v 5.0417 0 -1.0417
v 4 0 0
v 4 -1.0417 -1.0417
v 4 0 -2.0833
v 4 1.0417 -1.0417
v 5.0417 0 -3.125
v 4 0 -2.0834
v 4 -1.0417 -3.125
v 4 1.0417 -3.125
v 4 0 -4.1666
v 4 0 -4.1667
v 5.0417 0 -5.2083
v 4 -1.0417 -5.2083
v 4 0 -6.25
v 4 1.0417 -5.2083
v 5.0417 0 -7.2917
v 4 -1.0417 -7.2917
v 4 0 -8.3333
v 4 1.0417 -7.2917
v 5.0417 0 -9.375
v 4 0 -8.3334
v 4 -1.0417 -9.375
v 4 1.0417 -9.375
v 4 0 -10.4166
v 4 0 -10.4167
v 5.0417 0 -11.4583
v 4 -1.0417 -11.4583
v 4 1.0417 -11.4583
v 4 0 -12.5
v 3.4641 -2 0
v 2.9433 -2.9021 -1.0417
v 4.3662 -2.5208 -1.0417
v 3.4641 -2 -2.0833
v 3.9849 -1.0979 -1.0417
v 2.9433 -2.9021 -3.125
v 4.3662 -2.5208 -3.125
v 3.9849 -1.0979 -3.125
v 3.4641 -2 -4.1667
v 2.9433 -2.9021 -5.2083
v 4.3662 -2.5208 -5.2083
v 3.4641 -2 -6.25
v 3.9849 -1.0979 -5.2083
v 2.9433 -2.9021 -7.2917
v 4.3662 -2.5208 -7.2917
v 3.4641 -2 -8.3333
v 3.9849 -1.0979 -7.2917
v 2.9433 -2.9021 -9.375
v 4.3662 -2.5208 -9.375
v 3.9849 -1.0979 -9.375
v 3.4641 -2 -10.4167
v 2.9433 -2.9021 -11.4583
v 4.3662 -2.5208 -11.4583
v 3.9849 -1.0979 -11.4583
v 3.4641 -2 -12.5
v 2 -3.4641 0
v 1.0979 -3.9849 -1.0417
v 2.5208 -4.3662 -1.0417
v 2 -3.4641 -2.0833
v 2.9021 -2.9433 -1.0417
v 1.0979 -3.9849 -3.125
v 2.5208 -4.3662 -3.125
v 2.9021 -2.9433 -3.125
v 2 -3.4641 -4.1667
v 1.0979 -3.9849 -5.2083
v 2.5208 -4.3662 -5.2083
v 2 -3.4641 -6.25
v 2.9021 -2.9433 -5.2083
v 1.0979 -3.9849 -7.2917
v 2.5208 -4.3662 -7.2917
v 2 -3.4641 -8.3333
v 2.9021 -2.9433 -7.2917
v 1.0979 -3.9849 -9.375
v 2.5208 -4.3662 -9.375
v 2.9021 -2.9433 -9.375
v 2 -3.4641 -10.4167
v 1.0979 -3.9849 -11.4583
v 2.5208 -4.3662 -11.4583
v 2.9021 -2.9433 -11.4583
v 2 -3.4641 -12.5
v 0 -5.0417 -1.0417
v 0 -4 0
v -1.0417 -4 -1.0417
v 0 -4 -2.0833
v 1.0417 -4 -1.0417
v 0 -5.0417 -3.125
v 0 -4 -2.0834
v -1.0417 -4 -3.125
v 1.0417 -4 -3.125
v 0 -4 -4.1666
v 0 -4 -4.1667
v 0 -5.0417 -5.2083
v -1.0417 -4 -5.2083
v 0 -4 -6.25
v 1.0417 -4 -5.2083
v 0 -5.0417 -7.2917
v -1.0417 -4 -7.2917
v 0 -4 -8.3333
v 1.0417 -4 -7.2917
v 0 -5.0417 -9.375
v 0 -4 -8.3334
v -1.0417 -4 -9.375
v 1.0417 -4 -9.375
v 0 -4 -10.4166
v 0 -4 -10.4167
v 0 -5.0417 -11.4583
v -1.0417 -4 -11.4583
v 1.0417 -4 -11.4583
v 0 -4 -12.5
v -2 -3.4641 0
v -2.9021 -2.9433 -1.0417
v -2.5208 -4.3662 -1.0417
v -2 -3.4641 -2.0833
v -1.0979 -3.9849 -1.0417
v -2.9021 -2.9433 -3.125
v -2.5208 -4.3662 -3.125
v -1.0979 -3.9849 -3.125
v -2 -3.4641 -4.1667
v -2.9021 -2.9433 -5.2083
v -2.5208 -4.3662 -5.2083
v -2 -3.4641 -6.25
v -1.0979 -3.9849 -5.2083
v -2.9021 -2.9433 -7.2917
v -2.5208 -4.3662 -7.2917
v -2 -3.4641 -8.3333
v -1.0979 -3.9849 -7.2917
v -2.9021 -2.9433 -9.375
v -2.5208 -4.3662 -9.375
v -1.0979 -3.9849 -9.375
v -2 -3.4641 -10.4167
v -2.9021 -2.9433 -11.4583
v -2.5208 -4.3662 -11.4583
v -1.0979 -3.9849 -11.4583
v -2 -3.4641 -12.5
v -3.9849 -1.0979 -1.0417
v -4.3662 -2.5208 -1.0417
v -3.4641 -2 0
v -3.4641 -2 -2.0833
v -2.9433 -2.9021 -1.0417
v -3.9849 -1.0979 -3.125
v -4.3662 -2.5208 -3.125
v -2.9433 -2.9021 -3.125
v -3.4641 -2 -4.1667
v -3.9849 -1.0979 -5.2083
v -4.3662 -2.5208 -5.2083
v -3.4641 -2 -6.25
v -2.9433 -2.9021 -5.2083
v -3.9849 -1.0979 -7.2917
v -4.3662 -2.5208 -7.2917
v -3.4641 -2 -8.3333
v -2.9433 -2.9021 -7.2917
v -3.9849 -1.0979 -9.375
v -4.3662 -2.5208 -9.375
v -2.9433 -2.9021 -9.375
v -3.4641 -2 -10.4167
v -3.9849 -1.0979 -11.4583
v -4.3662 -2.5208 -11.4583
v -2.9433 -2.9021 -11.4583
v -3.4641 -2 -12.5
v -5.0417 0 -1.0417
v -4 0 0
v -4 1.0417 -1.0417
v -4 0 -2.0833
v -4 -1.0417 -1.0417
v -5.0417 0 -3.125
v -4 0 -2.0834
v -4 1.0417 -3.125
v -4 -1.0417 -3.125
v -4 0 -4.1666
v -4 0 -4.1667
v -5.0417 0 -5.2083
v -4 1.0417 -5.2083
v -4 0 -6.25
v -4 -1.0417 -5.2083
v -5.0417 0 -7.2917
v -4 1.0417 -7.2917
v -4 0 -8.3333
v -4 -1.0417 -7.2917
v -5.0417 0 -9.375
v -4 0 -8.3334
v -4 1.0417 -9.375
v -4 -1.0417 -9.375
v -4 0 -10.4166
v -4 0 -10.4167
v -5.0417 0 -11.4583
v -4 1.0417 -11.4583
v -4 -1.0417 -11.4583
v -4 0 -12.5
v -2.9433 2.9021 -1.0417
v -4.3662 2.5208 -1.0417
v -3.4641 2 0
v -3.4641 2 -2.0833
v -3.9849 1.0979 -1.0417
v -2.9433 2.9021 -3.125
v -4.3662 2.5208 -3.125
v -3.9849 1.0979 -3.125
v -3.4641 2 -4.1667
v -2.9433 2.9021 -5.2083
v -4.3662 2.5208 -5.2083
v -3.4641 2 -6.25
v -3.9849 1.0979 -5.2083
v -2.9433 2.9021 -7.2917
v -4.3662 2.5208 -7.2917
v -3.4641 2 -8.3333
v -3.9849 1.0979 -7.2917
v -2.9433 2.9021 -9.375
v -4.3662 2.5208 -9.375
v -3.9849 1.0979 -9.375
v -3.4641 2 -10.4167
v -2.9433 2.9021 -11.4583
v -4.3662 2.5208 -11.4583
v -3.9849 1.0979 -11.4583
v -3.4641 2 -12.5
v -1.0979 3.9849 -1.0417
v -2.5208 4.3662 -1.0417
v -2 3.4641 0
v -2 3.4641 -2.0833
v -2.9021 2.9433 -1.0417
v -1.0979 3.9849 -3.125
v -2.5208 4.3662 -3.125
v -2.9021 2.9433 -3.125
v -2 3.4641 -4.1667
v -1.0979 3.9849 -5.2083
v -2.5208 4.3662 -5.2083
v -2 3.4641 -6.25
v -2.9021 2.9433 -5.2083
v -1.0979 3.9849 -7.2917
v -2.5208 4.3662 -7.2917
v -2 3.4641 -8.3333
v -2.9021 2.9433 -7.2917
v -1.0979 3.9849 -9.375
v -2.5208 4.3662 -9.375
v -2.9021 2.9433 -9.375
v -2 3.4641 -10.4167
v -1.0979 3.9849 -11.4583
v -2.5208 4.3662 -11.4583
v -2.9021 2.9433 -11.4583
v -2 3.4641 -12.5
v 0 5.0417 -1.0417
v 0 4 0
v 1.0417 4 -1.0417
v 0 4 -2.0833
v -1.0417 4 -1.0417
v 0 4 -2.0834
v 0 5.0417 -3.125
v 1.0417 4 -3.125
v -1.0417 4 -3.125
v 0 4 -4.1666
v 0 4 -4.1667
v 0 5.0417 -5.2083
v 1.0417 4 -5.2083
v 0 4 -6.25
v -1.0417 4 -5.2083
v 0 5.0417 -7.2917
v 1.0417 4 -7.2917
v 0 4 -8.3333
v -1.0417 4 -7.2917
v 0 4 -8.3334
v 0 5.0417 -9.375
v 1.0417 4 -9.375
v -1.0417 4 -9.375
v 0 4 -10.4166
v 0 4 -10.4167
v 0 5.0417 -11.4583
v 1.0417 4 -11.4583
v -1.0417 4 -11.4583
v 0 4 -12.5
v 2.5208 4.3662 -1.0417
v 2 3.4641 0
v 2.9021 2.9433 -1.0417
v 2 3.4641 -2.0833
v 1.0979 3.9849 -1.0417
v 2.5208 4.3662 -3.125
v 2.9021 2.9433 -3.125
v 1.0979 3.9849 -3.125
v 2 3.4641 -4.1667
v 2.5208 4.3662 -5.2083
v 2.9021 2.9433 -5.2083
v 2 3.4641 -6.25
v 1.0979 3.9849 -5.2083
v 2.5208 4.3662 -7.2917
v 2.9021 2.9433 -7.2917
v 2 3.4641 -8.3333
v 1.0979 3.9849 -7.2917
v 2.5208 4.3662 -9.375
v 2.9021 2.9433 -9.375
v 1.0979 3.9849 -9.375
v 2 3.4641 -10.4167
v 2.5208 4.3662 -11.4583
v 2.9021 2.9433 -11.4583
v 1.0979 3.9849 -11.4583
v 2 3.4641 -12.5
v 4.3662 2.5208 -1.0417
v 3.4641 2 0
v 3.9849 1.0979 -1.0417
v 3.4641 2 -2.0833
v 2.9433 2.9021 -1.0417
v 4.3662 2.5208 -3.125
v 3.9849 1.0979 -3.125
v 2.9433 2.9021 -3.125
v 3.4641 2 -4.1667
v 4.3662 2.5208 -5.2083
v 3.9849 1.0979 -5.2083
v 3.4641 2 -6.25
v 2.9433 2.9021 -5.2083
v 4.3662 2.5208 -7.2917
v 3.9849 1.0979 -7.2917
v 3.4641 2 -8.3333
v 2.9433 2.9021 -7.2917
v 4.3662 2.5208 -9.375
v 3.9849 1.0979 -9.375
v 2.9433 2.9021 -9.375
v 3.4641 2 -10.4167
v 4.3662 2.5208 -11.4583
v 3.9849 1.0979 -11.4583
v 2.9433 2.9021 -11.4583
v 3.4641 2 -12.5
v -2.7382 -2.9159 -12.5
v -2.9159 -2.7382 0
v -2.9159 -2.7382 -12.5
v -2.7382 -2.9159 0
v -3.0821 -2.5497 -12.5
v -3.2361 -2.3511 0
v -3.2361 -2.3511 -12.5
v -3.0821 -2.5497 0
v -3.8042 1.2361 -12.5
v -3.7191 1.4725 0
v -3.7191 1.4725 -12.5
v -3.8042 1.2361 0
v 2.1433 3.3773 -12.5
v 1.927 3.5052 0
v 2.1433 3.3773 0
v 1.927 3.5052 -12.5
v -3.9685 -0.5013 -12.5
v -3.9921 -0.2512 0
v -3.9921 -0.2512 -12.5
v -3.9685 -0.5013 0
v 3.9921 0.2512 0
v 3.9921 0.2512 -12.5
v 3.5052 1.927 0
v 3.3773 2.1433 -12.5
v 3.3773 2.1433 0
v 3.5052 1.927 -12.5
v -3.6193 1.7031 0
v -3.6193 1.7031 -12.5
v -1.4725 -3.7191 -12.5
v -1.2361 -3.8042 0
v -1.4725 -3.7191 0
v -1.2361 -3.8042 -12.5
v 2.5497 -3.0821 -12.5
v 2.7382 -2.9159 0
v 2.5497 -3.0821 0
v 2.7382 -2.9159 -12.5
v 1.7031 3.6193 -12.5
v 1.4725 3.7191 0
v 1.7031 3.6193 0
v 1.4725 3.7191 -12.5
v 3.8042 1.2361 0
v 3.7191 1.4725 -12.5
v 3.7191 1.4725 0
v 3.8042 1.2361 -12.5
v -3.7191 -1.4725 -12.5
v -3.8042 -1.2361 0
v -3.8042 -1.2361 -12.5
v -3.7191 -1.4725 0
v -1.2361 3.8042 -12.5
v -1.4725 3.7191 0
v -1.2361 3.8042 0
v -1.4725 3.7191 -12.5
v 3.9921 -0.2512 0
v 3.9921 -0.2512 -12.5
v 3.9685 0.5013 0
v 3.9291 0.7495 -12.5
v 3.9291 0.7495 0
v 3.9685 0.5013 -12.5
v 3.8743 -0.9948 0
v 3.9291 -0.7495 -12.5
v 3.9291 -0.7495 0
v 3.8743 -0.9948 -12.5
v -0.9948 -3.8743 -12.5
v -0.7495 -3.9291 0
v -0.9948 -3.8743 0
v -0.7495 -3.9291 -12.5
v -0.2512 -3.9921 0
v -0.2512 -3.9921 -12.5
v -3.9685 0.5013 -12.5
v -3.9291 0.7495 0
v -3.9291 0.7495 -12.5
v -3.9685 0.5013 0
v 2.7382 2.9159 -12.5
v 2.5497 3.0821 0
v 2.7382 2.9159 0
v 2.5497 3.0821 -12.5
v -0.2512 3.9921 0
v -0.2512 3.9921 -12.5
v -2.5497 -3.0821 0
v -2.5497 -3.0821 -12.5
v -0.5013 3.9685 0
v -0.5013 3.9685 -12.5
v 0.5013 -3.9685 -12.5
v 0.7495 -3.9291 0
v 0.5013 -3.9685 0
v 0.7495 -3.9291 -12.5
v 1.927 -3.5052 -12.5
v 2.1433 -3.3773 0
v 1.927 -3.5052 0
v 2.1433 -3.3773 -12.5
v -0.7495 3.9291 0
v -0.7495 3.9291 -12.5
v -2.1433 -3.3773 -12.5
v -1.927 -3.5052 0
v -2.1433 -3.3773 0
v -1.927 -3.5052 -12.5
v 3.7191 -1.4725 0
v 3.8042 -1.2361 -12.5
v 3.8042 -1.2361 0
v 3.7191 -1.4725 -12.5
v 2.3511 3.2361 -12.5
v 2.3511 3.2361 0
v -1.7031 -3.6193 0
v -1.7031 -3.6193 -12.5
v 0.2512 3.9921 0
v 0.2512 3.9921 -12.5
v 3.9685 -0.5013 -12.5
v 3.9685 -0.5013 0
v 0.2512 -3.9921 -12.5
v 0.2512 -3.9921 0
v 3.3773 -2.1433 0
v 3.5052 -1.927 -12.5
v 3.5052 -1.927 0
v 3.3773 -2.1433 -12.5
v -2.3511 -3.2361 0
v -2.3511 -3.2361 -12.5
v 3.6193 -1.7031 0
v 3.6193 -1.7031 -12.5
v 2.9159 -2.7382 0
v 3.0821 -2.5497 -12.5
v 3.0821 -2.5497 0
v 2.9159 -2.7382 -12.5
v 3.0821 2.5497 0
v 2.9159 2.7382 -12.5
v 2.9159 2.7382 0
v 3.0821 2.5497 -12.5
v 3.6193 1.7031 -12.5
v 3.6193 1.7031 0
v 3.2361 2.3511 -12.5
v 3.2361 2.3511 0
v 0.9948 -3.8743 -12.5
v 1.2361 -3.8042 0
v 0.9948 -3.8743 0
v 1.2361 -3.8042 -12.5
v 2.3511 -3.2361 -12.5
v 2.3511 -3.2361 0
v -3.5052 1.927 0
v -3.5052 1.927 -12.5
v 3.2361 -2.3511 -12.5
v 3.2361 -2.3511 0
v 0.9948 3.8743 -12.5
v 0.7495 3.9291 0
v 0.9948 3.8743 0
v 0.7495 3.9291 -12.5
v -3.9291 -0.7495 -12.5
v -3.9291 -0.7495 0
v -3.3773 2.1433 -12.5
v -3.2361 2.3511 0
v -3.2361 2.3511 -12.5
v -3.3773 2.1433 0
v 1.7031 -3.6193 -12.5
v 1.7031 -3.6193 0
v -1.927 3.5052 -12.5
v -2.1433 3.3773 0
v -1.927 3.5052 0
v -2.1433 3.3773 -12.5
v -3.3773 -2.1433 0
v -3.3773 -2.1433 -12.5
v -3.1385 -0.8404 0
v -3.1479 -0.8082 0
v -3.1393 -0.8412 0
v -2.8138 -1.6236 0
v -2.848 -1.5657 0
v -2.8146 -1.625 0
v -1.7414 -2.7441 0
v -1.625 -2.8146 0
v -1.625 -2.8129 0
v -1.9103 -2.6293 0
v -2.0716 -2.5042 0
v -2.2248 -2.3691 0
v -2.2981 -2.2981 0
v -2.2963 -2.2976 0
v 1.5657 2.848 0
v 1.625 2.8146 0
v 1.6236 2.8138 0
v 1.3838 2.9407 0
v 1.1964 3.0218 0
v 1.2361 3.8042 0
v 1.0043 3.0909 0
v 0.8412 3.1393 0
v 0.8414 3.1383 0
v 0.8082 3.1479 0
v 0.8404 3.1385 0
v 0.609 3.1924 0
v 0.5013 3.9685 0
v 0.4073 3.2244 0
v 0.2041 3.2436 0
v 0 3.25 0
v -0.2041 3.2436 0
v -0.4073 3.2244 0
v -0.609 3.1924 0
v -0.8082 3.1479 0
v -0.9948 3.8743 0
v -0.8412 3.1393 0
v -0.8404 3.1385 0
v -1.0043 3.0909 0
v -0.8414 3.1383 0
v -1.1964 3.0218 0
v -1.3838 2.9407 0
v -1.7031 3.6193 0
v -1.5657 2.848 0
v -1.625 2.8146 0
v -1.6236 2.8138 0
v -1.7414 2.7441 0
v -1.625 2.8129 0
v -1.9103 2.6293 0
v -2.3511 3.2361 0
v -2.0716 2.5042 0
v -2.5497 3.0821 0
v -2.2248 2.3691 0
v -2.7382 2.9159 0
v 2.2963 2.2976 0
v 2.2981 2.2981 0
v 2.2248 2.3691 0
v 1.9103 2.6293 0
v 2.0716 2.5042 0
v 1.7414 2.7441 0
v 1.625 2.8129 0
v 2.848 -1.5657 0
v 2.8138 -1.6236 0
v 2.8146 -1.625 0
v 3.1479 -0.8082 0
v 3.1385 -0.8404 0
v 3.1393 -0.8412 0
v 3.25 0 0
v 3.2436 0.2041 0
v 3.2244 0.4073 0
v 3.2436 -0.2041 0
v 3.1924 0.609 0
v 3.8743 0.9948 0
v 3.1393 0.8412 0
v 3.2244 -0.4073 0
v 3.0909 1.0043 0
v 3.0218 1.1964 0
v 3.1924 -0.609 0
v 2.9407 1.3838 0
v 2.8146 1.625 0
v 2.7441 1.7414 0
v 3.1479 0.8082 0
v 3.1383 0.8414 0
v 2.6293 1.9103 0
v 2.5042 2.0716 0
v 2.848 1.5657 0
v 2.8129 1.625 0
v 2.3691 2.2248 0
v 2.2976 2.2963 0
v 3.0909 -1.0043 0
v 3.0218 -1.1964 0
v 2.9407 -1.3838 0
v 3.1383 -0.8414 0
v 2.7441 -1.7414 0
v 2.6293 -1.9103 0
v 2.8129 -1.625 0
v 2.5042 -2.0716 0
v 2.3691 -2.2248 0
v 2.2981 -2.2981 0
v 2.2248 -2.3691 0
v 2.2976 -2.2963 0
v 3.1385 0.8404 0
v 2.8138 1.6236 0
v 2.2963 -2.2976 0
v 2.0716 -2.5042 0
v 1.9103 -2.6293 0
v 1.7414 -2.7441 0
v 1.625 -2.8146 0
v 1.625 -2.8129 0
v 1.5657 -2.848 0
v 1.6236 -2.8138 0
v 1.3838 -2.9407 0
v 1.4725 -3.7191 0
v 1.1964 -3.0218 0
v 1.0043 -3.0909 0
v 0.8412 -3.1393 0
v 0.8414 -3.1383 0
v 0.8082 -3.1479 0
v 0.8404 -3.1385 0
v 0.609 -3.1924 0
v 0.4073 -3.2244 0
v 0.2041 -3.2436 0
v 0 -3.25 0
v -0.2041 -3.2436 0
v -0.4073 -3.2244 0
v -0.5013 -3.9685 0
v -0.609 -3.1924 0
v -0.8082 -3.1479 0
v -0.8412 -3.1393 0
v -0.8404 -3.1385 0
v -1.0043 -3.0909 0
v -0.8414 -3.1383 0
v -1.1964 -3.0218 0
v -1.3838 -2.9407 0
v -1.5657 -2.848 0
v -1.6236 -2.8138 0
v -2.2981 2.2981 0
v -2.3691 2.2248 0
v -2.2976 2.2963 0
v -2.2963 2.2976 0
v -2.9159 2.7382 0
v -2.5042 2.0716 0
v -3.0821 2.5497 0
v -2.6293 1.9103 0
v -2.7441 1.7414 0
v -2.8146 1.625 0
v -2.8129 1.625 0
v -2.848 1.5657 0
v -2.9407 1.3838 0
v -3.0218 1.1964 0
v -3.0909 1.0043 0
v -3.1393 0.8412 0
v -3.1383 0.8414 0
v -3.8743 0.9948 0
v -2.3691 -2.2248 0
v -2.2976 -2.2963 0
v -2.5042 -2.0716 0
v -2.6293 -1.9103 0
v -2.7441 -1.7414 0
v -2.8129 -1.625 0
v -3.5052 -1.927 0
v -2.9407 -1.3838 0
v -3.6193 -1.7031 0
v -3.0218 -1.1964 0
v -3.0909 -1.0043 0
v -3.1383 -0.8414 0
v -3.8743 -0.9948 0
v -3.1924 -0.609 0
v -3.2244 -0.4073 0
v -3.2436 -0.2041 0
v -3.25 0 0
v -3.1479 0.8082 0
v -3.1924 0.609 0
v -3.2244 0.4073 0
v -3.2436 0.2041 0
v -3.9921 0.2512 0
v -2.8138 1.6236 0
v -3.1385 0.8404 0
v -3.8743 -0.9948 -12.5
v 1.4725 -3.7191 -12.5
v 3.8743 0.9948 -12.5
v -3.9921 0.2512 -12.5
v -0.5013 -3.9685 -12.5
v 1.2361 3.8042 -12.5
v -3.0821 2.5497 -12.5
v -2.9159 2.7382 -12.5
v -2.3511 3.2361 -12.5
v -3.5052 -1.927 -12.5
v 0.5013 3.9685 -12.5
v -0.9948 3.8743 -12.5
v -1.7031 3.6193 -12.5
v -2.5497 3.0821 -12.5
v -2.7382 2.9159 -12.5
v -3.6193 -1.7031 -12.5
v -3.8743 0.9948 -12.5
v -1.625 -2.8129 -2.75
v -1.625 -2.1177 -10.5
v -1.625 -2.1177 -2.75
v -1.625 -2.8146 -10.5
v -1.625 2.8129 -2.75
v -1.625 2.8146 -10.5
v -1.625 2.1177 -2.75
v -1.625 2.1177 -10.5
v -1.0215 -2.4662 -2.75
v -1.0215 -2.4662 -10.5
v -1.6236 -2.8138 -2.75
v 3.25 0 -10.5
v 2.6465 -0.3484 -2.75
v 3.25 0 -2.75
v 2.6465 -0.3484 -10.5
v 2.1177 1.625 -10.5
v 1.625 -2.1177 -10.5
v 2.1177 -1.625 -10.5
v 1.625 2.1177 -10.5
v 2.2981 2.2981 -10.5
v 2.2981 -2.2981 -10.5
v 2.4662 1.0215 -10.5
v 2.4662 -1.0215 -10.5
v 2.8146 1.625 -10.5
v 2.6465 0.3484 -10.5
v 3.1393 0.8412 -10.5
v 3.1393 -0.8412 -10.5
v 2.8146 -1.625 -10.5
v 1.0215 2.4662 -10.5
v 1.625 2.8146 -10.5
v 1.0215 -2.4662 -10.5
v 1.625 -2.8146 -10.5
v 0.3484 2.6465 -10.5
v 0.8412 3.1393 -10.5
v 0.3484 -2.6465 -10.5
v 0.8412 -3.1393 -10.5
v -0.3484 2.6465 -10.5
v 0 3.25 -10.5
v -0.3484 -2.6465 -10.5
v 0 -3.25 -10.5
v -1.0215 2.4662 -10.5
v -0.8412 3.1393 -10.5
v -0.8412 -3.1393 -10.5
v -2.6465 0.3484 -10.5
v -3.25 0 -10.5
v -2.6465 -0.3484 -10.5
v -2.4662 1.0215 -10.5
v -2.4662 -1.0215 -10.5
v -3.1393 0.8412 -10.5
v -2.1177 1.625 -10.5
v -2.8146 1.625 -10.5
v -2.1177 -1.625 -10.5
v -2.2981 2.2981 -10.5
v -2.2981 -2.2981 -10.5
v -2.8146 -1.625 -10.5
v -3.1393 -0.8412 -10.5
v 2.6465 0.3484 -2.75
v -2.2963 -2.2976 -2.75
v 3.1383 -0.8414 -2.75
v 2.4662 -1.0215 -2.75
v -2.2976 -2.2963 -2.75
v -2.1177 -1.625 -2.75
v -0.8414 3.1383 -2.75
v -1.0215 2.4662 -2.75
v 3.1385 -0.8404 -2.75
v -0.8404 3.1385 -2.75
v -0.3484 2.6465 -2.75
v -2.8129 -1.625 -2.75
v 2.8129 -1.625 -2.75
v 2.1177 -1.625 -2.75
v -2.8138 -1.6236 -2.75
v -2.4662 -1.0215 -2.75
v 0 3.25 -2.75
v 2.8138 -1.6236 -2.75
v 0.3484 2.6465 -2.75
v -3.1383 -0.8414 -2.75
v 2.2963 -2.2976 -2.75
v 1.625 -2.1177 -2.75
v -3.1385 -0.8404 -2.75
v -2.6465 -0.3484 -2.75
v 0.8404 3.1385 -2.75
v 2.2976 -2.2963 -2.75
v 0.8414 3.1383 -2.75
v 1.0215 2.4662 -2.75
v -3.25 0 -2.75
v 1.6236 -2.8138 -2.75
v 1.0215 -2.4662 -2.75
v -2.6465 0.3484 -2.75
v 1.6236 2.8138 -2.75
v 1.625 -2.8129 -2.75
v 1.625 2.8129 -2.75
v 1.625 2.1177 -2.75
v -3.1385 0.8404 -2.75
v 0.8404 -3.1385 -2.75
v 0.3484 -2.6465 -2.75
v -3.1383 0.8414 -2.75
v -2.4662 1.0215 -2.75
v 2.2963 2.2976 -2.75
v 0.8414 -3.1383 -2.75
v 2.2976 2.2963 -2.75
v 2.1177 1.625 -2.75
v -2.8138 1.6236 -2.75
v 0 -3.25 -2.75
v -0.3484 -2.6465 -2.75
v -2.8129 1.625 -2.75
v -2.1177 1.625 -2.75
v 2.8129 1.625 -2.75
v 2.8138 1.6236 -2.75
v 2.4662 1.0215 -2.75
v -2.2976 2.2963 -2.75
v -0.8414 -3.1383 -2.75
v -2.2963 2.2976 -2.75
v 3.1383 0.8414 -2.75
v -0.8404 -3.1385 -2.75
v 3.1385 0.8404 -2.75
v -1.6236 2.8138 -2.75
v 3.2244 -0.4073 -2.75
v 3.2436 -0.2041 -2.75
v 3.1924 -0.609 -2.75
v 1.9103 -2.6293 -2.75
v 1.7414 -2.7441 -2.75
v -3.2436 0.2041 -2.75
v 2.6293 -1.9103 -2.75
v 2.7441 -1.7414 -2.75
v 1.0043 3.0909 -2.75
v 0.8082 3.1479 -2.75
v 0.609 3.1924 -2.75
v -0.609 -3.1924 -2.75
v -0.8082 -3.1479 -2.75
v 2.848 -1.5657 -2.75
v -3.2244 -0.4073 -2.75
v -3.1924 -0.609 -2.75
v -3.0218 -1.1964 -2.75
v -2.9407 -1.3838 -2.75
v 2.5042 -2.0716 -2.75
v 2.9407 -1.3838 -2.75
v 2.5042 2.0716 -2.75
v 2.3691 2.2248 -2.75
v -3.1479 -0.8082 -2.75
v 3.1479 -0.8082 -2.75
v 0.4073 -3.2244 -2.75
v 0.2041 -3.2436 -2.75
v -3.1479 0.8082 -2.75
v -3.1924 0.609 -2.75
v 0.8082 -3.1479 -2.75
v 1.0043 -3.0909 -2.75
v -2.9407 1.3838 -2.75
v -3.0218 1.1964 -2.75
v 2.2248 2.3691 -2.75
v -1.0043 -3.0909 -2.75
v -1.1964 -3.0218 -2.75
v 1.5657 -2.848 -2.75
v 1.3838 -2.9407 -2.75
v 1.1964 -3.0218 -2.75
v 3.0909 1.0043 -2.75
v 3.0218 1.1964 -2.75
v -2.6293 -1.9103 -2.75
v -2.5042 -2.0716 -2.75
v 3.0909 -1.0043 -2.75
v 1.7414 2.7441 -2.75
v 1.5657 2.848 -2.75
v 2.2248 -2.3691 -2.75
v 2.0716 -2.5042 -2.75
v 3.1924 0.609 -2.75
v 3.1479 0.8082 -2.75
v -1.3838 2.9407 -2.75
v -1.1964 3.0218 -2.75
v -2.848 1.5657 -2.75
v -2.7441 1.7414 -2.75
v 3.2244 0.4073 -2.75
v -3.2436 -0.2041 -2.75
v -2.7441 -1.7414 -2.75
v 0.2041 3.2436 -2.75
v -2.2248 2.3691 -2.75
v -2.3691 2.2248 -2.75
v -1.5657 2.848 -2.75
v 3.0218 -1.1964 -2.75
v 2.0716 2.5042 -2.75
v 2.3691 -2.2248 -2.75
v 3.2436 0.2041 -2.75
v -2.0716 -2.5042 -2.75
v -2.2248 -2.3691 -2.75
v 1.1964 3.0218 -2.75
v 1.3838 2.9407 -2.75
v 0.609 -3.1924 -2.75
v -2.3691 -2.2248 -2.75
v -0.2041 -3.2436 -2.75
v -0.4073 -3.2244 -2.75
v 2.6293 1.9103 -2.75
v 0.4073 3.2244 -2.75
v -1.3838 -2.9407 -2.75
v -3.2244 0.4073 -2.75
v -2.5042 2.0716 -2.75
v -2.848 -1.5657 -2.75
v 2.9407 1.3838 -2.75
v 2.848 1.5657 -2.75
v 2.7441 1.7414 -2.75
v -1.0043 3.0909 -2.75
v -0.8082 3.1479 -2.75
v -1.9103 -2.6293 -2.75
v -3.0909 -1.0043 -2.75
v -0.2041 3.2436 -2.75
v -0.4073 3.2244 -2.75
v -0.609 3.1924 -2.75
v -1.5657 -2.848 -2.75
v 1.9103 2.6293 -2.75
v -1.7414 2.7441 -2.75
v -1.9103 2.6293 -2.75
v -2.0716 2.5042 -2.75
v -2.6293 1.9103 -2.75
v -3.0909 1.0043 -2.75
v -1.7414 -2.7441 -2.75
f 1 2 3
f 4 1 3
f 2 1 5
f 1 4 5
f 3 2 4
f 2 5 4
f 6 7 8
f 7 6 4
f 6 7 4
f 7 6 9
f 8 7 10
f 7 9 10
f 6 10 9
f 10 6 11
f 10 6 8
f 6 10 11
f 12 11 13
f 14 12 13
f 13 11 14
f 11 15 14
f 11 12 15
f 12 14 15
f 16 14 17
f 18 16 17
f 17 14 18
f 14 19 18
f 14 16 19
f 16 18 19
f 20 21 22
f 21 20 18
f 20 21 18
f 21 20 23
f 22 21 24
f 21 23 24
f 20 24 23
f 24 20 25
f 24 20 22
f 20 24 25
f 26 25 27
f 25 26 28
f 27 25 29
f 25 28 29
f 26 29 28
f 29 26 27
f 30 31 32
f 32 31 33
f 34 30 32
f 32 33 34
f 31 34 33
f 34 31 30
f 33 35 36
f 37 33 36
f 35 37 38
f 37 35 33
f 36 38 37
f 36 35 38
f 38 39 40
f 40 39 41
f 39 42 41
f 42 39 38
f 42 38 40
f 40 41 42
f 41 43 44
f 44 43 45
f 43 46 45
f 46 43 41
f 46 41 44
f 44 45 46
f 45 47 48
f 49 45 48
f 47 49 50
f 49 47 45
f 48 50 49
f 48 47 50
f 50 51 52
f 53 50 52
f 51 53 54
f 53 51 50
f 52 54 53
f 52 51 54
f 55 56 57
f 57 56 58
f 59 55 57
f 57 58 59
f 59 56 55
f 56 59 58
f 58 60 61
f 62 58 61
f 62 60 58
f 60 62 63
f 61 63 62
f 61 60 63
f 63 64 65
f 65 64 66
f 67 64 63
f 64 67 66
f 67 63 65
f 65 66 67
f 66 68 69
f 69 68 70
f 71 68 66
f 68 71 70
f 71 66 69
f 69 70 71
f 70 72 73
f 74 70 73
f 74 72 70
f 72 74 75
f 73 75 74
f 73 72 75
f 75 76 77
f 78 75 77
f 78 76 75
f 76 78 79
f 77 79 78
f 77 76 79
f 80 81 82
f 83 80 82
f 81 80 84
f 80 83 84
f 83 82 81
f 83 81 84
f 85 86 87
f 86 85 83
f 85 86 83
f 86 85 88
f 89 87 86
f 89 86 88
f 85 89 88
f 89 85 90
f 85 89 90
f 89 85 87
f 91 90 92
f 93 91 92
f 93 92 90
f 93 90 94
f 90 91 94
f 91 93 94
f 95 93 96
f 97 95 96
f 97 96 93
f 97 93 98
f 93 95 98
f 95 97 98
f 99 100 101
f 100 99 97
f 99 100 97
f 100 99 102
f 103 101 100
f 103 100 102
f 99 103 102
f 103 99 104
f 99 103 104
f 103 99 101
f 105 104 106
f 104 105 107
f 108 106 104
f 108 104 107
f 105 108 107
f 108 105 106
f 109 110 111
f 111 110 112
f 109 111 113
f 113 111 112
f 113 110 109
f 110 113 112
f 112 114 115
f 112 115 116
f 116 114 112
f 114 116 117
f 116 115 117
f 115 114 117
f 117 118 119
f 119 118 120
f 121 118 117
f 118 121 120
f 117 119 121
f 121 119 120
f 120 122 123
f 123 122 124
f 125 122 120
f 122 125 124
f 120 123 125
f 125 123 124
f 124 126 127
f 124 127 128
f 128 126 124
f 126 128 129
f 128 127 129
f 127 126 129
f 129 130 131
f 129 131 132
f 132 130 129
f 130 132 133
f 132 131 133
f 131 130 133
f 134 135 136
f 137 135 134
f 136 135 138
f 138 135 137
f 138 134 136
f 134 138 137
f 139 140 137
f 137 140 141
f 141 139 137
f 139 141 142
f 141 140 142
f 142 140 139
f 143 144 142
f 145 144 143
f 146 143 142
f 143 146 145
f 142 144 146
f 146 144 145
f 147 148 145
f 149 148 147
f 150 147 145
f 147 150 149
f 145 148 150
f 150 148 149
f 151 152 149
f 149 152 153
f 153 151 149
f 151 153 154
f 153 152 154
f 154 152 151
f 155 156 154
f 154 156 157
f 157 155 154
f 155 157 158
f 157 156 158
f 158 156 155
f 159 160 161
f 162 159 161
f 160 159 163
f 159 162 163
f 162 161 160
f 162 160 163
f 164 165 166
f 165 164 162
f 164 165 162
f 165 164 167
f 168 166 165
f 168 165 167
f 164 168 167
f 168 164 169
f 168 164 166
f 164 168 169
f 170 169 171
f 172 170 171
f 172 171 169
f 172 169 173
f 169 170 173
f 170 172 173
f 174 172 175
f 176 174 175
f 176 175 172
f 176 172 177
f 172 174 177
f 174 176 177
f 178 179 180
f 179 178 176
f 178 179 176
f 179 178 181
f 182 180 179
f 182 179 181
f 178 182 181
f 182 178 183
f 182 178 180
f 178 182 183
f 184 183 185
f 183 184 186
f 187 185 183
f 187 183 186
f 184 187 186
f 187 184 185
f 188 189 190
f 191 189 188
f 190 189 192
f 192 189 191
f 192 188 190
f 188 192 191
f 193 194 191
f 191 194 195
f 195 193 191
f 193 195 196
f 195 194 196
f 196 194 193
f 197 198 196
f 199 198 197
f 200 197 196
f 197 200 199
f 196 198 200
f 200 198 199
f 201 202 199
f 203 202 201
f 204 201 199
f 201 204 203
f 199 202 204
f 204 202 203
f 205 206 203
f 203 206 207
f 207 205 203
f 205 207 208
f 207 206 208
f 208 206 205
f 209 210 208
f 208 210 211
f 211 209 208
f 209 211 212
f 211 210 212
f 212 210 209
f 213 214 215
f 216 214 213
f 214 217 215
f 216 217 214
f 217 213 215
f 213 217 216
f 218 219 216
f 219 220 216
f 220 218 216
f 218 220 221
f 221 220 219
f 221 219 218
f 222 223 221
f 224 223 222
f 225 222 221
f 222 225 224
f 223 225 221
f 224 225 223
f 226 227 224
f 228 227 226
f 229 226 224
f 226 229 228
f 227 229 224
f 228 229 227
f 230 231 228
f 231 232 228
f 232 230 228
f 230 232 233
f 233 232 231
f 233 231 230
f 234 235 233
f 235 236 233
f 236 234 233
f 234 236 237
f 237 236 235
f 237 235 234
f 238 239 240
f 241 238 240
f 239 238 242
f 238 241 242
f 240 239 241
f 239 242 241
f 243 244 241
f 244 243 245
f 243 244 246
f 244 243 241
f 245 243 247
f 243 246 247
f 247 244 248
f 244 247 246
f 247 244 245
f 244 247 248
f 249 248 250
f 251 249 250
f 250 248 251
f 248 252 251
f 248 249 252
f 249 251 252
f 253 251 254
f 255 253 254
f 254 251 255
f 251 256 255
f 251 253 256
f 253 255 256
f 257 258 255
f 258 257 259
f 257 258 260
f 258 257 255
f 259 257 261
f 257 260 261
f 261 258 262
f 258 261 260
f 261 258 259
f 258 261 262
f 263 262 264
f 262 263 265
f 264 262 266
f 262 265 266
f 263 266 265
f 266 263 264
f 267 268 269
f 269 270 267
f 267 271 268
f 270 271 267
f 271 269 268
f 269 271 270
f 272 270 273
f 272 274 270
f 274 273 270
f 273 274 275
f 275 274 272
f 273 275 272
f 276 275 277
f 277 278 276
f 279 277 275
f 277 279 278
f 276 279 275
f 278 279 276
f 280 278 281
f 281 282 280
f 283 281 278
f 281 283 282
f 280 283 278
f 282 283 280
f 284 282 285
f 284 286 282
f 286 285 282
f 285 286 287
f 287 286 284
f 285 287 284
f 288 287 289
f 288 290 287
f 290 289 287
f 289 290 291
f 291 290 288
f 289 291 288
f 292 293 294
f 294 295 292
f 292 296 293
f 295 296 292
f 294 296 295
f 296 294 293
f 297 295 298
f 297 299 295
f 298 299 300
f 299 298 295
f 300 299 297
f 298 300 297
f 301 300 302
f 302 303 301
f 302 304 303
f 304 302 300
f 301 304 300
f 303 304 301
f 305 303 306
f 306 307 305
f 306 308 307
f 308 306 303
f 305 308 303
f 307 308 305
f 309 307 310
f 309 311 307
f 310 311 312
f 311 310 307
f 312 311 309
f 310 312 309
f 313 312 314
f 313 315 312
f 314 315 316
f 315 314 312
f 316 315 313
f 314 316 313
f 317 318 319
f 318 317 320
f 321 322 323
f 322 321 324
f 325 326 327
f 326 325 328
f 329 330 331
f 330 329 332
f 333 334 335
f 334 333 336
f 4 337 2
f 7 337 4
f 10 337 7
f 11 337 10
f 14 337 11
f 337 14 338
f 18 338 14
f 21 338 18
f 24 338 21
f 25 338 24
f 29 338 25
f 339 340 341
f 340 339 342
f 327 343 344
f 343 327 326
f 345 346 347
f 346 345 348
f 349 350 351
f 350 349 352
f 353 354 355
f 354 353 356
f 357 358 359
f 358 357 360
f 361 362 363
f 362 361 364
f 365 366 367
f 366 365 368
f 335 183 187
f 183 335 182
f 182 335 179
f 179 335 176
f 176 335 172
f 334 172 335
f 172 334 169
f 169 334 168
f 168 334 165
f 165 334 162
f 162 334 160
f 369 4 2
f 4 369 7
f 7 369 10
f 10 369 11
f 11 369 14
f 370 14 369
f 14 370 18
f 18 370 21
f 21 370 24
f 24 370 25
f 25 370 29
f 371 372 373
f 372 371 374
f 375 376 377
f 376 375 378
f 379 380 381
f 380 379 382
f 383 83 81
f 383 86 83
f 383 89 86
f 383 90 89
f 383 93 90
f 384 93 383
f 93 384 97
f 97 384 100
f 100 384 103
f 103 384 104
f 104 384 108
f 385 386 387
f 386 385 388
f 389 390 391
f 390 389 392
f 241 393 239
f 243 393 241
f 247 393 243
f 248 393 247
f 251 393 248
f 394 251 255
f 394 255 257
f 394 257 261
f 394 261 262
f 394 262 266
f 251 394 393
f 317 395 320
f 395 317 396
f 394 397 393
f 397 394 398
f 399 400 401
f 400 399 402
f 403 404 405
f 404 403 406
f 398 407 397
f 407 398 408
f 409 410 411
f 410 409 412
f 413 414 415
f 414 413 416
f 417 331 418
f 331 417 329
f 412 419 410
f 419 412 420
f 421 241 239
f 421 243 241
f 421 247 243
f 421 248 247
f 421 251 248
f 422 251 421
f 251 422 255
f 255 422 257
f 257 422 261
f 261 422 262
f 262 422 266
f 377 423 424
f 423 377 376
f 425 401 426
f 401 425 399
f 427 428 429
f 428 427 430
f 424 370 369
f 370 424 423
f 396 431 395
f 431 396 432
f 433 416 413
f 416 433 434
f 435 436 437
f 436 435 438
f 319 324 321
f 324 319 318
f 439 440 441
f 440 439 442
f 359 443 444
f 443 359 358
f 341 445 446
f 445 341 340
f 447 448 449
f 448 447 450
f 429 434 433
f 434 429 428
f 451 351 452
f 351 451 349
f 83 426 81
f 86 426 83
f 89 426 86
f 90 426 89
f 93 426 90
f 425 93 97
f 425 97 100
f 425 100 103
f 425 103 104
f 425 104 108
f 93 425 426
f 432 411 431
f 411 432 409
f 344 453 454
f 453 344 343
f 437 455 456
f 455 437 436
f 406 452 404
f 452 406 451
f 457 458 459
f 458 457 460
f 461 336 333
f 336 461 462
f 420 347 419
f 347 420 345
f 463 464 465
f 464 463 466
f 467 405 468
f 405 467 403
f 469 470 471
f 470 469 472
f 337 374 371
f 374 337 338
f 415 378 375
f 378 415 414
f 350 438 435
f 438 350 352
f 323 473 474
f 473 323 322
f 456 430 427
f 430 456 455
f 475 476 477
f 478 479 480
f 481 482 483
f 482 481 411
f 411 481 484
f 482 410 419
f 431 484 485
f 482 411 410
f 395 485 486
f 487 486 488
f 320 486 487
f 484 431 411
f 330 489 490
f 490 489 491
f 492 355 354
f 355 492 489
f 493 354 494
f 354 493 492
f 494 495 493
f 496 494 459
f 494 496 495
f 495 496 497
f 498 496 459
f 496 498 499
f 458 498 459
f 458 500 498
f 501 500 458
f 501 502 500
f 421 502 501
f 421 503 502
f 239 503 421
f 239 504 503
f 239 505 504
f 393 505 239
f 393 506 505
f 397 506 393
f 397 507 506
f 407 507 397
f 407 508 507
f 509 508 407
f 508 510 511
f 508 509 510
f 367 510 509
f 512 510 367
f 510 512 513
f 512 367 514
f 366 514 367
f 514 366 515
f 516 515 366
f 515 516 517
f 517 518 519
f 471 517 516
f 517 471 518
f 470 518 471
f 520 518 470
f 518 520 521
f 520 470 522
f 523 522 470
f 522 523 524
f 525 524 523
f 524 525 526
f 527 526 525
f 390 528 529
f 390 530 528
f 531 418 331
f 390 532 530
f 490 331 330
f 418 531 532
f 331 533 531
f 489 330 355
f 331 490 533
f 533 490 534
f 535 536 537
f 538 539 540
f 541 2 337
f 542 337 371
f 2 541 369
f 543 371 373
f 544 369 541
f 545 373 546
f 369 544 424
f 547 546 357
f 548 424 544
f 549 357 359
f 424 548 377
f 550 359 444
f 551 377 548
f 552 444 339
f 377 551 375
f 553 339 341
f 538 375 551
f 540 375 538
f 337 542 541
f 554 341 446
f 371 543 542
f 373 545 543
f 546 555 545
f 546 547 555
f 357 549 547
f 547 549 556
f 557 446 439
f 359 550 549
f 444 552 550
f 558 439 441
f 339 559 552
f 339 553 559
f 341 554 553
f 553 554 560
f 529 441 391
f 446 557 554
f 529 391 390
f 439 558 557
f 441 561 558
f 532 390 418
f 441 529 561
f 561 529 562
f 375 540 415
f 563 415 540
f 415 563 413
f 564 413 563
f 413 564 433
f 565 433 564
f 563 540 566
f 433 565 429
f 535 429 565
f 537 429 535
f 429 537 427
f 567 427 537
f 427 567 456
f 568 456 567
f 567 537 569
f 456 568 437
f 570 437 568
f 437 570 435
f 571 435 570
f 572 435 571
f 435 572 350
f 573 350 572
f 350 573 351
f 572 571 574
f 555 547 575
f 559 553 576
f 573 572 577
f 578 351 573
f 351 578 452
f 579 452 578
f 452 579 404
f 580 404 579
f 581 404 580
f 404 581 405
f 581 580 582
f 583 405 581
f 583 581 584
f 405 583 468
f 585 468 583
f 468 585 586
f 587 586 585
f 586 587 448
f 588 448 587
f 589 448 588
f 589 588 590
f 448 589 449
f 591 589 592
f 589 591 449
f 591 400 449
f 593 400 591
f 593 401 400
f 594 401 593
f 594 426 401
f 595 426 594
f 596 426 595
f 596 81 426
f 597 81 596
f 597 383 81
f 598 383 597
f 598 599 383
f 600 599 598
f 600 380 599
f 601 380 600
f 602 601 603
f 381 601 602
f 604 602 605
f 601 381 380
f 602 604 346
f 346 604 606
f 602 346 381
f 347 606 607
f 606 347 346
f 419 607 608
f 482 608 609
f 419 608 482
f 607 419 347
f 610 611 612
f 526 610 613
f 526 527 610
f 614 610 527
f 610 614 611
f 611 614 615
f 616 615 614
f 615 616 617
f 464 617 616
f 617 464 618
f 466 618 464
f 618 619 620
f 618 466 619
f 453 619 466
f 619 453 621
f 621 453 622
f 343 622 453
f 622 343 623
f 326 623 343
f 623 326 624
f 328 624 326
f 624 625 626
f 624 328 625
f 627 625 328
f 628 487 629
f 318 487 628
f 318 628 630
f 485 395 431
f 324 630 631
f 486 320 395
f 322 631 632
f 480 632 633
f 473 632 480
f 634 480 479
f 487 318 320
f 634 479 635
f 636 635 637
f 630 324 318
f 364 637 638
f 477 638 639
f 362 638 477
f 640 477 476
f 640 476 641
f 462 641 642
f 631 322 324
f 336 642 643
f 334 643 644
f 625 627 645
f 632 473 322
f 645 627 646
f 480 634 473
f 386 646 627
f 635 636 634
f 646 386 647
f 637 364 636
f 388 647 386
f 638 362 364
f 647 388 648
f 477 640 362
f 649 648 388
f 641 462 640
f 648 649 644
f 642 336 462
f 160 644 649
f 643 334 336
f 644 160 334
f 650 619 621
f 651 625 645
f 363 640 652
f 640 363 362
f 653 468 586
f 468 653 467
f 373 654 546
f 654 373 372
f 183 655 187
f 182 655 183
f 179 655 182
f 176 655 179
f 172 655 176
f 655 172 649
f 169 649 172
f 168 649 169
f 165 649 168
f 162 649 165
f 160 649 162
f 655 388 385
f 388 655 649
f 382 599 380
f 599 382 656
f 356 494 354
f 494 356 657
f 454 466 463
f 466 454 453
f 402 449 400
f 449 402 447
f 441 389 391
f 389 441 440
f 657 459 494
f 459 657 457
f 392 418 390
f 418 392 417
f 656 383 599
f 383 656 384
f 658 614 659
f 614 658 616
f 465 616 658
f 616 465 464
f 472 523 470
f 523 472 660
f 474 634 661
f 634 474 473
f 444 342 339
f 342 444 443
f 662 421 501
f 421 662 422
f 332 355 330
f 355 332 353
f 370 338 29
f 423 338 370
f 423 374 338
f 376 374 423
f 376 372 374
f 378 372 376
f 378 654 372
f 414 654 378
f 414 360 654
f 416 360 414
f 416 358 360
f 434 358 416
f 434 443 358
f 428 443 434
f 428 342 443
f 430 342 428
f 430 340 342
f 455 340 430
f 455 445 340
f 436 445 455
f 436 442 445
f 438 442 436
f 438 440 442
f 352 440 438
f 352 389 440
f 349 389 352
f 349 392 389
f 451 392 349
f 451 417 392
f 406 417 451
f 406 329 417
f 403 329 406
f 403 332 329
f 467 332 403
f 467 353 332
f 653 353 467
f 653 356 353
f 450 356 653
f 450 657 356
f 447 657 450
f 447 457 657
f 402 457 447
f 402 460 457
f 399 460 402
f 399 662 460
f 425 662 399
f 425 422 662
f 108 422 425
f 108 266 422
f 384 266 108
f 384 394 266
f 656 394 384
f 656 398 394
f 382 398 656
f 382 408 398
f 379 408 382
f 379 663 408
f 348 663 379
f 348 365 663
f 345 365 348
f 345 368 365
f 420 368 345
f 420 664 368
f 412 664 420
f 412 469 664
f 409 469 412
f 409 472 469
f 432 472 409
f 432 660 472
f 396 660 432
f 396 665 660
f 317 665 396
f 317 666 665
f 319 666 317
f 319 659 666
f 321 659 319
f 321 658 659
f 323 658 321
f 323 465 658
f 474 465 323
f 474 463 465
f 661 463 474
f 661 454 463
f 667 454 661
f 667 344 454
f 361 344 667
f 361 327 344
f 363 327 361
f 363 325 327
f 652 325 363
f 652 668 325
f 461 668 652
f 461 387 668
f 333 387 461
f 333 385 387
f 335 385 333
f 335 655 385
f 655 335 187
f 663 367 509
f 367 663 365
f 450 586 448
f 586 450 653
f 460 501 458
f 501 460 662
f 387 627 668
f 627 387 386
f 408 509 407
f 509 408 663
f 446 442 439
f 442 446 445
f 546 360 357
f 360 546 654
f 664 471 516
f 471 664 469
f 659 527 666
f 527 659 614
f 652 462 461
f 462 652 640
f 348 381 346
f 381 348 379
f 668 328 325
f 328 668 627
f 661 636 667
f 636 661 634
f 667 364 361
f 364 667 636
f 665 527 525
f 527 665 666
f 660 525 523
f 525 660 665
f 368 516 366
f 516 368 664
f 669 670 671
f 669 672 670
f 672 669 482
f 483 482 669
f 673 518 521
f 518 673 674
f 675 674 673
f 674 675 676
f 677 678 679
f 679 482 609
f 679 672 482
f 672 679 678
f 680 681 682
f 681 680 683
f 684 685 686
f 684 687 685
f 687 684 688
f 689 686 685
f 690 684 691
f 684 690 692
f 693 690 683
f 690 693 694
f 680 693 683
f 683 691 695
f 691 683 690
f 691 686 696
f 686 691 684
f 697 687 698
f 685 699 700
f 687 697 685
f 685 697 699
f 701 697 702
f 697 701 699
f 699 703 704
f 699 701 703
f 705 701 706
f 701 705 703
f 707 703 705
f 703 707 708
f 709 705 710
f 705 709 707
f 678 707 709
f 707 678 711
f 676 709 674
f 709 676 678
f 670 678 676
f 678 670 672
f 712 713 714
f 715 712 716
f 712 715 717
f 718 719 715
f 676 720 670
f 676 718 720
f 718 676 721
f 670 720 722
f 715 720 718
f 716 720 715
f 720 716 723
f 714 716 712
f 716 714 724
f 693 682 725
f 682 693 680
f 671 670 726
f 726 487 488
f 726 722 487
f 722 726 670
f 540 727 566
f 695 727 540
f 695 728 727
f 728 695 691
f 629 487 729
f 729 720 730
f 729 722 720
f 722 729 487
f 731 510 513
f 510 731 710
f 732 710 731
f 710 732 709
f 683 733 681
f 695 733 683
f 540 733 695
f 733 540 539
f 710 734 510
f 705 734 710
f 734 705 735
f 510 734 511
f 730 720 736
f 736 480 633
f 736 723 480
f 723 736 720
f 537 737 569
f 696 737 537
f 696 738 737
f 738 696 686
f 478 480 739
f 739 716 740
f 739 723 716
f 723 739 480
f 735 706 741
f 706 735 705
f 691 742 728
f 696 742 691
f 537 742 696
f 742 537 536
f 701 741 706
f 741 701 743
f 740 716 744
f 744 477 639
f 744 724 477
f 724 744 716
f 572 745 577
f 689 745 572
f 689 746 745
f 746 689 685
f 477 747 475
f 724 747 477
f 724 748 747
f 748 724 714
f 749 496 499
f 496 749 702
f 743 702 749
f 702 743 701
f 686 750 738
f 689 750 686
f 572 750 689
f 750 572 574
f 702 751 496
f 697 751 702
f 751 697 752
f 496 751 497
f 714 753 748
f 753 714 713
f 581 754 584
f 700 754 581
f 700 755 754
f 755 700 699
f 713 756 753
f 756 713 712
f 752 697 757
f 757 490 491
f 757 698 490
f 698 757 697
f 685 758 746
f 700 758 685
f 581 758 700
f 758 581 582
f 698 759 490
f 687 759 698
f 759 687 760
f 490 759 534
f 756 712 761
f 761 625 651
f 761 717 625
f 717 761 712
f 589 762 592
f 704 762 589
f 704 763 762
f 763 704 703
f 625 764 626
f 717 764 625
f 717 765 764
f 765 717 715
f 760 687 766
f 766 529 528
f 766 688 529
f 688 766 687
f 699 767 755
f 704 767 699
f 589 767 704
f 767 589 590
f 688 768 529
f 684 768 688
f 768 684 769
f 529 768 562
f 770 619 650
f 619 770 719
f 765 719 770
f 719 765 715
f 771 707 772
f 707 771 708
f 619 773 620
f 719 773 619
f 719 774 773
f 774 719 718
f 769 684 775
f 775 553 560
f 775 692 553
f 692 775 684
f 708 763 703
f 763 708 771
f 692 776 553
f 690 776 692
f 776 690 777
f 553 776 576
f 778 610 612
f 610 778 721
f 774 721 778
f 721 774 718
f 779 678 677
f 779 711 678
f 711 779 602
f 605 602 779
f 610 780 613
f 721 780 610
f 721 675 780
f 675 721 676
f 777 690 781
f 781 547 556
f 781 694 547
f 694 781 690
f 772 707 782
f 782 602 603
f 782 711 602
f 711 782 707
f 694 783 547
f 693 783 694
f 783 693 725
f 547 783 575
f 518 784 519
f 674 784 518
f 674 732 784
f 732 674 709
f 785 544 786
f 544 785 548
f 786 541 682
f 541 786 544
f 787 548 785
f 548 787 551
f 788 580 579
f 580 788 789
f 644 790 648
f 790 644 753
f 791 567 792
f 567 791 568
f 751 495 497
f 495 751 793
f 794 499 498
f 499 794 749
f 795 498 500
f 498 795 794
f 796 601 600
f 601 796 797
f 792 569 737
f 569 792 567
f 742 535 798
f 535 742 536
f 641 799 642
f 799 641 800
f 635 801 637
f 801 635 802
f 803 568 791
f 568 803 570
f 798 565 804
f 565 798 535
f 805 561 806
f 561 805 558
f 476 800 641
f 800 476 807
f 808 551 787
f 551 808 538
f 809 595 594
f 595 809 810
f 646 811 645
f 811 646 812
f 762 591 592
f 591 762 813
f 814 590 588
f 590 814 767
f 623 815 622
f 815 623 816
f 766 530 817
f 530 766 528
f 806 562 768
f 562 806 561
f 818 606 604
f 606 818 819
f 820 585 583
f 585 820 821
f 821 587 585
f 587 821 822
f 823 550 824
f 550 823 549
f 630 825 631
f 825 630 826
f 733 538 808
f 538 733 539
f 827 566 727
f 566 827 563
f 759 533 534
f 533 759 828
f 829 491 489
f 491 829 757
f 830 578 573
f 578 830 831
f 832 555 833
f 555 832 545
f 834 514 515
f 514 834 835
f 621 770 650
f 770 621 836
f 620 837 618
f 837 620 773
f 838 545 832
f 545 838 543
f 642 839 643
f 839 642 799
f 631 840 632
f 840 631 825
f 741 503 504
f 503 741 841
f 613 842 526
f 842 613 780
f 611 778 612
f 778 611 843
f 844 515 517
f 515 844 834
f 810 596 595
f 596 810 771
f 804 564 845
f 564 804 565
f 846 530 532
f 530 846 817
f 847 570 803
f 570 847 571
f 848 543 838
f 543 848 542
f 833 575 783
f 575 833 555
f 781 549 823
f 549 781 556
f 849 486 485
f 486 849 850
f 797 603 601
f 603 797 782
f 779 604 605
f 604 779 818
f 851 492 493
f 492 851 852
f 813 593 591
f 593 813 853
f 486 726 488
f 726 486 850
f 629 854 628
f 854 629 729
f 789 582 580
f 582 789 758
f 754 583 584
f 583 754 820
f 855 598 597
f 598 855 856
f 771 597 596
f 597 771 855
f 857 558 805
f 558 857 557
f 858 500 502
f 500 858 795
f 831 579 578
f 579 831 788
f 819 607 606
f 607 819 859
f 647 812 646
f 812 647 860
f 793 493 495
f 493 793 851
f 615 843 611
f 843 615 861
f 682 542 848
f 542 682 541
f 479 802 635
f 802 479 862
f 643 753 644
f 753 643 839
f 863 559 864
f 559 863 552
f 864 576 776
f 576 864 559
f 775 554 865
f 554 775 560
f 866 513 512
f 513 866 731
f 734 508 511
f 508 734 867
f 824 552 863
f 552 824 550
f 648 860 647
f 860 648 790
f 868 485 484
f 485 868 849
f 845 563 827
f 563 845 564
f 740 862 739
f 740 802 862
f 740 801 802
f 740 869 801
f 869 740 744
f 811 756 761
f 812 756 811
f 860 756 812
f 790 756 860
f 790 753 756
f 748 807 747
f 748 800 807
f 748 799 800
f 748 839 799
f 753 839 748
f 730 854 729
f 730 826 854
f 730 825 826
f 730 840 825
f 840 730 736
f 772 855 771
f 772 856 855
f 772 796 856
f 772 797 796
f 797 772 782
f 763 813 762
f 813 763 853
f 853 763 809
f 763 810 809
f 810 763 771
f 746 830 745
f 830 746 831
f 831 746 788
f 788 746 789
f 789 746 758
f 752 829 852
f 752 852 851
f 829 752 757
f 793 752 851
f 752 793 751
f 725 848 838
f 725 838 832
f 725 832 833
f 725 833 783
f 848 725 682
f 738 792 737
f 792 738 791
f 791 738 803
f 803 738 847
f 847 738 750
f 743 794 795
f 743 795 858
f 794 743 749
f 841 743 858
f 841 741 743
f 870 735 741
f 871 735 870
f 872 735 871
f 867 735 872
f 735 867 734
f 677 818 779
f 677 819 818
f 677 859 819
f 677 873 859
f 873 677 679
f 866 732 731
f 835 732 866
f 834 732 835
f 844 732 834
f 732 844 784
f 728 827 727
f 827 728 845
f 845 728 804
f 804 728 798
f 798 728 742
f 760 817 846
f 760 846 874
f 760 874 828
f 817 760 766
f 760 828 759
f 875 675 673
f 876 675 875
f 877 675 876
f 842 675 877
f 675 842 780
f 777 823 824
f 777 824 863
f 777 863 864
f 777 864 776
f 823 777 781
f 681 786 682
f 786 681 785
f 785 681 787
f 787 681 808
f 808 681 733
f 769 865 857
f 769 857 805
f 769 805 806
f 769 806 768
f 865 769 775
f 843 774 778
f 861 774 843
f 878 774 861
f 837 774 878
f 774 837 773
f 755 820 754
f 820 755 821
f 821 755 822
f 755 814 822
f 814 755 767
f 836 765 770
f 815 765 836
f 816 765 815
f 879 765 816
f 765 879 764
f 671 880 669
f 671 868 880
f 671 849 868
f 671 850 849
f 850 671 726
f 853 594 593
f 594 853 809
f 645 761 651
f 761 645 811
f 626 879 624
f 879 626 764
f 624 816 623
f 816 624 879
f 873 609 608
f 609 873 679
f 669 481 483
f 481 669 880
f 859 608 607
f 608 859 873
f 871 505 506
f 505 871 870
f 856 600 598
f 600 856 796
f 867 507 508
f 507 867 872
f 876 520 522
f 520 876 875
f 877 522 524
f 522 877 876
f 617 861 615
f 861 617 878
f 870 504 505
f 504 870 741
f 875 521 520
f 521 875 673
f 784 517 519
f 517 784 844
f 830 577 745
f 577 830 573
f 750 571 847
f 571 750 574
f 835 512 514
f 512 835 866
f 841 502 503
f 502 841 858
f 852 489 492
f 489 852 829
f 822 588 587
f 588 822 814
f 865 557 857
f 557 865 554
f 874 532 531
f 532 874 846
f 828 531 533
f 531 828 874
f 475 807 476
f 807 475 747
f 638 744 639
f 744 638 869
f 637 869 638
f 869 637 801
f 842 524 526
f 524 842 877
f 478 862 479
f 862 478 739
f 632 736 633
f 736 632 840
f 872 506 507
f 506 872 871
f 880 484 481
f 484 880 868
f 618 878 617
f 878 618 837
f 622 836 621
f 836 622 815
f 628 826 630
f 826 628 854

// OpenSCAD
// This is a Guitar Knob Insert.
//
// Warning -- some sanding and fitting may be required.
//
// This is licensed under the creative commons+attribution license
//
// To fulfil the attribution requirement, please link to:
// http://www.thingiverse.com/thing:2226463

/* [Main] */

// Define number of facets (large numbers provide better smoothing)
$fn=100;

// Define height of knob in mm
height=12.5;

// Define outside diameter of knob in mm (without knurl)
outside_diameter=8.0;

// Define depth of hole in mm
depth=10.0;

// Define inside diameter of hole in mm
hole_diameter=6.5;

// Define number of splines (must be multiple of 3)
splines=24;

// Define height of splines in mm
spline_height=7.0;

rotate([180,0]) knob_insert();

module knurl()
{
	for(i=[0:1:5])
	{
		translate([outside_diameter/2+height/24,0,i*height/6+height/12]) rotate([0,90,0]) cylinder(h=height/12,r1=height/12,r2=0,center=true,$fn=4);
	}
}

module splines()
{
	union()
	{
		if(splines==0)
		{
			translate([0,0,depth/2]) rotate([0,0,angle]) cylinder(h=depth+1,r=hole_diameter/2,center=true,$fn=100);
		}
		if(splines!=0)
		{
			for(angle=[0:360/splines:360/3])
			{
				translate([0,0,depth/2]) rotate([0,0,angle]) cylinder(h=depth+1,r=hole_diameter/2,center=true,$fn=3);
			}
		}
		translate([0,0,-0.25]) cylinder(h=depth-spline_height,r=hole_diameter/2,center=false,$fn=100);
	}
}

module knob_insert() {
difference()
{
	union()
	{
		// Draw outer shape
		translate([0,0,0]) cylinder(h=height,r=outside_diameter/2,center=false);

		// Draw small pyramids
		for(angle=[0:30:330])
		{
			rotate([0,0,angle]) knurl();
		}
	}

	// Drill inside hole
	splines();
}
}
